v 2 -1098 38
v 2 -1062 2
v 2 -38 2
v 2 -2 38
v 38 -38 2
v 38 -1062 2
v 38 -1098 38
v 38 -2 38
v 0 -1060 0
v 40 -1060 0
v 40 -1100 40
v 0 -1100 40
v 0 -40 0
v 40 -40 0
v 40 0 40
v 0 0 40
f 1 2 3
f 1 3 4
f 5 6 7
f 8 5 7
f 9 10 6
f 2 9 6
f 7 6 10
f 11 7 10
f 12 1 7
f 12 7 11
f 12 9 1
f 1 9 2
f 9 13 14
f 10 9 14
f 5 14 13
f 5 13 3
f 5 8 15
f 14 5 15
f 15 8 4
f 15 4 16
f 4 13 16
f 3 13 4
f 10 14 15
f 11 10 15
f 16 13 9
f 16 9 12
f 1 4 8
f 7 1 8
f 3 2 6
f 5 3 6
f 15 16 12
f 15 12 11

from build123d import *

# Parameters (mm, degrees)
F0_W        = 40
F0_H        = 40
F1_DEPTH    = 1100
F2_W        = 36
F2_H        = 36
F3_DEPTH    = 1100.001
F4_T1_DEPTH = 245.7346390373


# Not quite as in the source:
# - a fillet or chamfer that OpenCascade refuses, or shapes differently, is made with other operations: its cross-section is extruded or revolved along the edge and cut away or added


with BuildPart() as f1:
    # F0 (on Front) → F1 (new body)
    with BuildSketch(Plane.XZ):
        with Locations((20, 20)):
            Rectangle(F0_W, F0_H)
    extrude(amount=F1_DEPTH)

    # F2 (on face) → F3 (cut, through all)
    with BuildSketch(Plane.XZ.offset(1100)):
        with Locations((20, 20)):
            Rectangle(F2_W, F2_H)
    extrude(amount=-F3_DEPTH, mode=Mode.SUBTRACT)

    # F4: chamfer of 40 on 2 edges, made by hand

    # F4_s2 → F4_t1 (cut)
    with BuildSketch(Plane.YZ.offset(-102.8673195186)):
        Polygon((-1060, 0), (-1100, 40), (-1100, 0), align=None)
        Polygon((-40, 0), (0, 40), (0, 0), align=None)
    extrude(amount=F4_T1_DEPTH, mode=Mode.SUBTRACT)


solid = f1.part
